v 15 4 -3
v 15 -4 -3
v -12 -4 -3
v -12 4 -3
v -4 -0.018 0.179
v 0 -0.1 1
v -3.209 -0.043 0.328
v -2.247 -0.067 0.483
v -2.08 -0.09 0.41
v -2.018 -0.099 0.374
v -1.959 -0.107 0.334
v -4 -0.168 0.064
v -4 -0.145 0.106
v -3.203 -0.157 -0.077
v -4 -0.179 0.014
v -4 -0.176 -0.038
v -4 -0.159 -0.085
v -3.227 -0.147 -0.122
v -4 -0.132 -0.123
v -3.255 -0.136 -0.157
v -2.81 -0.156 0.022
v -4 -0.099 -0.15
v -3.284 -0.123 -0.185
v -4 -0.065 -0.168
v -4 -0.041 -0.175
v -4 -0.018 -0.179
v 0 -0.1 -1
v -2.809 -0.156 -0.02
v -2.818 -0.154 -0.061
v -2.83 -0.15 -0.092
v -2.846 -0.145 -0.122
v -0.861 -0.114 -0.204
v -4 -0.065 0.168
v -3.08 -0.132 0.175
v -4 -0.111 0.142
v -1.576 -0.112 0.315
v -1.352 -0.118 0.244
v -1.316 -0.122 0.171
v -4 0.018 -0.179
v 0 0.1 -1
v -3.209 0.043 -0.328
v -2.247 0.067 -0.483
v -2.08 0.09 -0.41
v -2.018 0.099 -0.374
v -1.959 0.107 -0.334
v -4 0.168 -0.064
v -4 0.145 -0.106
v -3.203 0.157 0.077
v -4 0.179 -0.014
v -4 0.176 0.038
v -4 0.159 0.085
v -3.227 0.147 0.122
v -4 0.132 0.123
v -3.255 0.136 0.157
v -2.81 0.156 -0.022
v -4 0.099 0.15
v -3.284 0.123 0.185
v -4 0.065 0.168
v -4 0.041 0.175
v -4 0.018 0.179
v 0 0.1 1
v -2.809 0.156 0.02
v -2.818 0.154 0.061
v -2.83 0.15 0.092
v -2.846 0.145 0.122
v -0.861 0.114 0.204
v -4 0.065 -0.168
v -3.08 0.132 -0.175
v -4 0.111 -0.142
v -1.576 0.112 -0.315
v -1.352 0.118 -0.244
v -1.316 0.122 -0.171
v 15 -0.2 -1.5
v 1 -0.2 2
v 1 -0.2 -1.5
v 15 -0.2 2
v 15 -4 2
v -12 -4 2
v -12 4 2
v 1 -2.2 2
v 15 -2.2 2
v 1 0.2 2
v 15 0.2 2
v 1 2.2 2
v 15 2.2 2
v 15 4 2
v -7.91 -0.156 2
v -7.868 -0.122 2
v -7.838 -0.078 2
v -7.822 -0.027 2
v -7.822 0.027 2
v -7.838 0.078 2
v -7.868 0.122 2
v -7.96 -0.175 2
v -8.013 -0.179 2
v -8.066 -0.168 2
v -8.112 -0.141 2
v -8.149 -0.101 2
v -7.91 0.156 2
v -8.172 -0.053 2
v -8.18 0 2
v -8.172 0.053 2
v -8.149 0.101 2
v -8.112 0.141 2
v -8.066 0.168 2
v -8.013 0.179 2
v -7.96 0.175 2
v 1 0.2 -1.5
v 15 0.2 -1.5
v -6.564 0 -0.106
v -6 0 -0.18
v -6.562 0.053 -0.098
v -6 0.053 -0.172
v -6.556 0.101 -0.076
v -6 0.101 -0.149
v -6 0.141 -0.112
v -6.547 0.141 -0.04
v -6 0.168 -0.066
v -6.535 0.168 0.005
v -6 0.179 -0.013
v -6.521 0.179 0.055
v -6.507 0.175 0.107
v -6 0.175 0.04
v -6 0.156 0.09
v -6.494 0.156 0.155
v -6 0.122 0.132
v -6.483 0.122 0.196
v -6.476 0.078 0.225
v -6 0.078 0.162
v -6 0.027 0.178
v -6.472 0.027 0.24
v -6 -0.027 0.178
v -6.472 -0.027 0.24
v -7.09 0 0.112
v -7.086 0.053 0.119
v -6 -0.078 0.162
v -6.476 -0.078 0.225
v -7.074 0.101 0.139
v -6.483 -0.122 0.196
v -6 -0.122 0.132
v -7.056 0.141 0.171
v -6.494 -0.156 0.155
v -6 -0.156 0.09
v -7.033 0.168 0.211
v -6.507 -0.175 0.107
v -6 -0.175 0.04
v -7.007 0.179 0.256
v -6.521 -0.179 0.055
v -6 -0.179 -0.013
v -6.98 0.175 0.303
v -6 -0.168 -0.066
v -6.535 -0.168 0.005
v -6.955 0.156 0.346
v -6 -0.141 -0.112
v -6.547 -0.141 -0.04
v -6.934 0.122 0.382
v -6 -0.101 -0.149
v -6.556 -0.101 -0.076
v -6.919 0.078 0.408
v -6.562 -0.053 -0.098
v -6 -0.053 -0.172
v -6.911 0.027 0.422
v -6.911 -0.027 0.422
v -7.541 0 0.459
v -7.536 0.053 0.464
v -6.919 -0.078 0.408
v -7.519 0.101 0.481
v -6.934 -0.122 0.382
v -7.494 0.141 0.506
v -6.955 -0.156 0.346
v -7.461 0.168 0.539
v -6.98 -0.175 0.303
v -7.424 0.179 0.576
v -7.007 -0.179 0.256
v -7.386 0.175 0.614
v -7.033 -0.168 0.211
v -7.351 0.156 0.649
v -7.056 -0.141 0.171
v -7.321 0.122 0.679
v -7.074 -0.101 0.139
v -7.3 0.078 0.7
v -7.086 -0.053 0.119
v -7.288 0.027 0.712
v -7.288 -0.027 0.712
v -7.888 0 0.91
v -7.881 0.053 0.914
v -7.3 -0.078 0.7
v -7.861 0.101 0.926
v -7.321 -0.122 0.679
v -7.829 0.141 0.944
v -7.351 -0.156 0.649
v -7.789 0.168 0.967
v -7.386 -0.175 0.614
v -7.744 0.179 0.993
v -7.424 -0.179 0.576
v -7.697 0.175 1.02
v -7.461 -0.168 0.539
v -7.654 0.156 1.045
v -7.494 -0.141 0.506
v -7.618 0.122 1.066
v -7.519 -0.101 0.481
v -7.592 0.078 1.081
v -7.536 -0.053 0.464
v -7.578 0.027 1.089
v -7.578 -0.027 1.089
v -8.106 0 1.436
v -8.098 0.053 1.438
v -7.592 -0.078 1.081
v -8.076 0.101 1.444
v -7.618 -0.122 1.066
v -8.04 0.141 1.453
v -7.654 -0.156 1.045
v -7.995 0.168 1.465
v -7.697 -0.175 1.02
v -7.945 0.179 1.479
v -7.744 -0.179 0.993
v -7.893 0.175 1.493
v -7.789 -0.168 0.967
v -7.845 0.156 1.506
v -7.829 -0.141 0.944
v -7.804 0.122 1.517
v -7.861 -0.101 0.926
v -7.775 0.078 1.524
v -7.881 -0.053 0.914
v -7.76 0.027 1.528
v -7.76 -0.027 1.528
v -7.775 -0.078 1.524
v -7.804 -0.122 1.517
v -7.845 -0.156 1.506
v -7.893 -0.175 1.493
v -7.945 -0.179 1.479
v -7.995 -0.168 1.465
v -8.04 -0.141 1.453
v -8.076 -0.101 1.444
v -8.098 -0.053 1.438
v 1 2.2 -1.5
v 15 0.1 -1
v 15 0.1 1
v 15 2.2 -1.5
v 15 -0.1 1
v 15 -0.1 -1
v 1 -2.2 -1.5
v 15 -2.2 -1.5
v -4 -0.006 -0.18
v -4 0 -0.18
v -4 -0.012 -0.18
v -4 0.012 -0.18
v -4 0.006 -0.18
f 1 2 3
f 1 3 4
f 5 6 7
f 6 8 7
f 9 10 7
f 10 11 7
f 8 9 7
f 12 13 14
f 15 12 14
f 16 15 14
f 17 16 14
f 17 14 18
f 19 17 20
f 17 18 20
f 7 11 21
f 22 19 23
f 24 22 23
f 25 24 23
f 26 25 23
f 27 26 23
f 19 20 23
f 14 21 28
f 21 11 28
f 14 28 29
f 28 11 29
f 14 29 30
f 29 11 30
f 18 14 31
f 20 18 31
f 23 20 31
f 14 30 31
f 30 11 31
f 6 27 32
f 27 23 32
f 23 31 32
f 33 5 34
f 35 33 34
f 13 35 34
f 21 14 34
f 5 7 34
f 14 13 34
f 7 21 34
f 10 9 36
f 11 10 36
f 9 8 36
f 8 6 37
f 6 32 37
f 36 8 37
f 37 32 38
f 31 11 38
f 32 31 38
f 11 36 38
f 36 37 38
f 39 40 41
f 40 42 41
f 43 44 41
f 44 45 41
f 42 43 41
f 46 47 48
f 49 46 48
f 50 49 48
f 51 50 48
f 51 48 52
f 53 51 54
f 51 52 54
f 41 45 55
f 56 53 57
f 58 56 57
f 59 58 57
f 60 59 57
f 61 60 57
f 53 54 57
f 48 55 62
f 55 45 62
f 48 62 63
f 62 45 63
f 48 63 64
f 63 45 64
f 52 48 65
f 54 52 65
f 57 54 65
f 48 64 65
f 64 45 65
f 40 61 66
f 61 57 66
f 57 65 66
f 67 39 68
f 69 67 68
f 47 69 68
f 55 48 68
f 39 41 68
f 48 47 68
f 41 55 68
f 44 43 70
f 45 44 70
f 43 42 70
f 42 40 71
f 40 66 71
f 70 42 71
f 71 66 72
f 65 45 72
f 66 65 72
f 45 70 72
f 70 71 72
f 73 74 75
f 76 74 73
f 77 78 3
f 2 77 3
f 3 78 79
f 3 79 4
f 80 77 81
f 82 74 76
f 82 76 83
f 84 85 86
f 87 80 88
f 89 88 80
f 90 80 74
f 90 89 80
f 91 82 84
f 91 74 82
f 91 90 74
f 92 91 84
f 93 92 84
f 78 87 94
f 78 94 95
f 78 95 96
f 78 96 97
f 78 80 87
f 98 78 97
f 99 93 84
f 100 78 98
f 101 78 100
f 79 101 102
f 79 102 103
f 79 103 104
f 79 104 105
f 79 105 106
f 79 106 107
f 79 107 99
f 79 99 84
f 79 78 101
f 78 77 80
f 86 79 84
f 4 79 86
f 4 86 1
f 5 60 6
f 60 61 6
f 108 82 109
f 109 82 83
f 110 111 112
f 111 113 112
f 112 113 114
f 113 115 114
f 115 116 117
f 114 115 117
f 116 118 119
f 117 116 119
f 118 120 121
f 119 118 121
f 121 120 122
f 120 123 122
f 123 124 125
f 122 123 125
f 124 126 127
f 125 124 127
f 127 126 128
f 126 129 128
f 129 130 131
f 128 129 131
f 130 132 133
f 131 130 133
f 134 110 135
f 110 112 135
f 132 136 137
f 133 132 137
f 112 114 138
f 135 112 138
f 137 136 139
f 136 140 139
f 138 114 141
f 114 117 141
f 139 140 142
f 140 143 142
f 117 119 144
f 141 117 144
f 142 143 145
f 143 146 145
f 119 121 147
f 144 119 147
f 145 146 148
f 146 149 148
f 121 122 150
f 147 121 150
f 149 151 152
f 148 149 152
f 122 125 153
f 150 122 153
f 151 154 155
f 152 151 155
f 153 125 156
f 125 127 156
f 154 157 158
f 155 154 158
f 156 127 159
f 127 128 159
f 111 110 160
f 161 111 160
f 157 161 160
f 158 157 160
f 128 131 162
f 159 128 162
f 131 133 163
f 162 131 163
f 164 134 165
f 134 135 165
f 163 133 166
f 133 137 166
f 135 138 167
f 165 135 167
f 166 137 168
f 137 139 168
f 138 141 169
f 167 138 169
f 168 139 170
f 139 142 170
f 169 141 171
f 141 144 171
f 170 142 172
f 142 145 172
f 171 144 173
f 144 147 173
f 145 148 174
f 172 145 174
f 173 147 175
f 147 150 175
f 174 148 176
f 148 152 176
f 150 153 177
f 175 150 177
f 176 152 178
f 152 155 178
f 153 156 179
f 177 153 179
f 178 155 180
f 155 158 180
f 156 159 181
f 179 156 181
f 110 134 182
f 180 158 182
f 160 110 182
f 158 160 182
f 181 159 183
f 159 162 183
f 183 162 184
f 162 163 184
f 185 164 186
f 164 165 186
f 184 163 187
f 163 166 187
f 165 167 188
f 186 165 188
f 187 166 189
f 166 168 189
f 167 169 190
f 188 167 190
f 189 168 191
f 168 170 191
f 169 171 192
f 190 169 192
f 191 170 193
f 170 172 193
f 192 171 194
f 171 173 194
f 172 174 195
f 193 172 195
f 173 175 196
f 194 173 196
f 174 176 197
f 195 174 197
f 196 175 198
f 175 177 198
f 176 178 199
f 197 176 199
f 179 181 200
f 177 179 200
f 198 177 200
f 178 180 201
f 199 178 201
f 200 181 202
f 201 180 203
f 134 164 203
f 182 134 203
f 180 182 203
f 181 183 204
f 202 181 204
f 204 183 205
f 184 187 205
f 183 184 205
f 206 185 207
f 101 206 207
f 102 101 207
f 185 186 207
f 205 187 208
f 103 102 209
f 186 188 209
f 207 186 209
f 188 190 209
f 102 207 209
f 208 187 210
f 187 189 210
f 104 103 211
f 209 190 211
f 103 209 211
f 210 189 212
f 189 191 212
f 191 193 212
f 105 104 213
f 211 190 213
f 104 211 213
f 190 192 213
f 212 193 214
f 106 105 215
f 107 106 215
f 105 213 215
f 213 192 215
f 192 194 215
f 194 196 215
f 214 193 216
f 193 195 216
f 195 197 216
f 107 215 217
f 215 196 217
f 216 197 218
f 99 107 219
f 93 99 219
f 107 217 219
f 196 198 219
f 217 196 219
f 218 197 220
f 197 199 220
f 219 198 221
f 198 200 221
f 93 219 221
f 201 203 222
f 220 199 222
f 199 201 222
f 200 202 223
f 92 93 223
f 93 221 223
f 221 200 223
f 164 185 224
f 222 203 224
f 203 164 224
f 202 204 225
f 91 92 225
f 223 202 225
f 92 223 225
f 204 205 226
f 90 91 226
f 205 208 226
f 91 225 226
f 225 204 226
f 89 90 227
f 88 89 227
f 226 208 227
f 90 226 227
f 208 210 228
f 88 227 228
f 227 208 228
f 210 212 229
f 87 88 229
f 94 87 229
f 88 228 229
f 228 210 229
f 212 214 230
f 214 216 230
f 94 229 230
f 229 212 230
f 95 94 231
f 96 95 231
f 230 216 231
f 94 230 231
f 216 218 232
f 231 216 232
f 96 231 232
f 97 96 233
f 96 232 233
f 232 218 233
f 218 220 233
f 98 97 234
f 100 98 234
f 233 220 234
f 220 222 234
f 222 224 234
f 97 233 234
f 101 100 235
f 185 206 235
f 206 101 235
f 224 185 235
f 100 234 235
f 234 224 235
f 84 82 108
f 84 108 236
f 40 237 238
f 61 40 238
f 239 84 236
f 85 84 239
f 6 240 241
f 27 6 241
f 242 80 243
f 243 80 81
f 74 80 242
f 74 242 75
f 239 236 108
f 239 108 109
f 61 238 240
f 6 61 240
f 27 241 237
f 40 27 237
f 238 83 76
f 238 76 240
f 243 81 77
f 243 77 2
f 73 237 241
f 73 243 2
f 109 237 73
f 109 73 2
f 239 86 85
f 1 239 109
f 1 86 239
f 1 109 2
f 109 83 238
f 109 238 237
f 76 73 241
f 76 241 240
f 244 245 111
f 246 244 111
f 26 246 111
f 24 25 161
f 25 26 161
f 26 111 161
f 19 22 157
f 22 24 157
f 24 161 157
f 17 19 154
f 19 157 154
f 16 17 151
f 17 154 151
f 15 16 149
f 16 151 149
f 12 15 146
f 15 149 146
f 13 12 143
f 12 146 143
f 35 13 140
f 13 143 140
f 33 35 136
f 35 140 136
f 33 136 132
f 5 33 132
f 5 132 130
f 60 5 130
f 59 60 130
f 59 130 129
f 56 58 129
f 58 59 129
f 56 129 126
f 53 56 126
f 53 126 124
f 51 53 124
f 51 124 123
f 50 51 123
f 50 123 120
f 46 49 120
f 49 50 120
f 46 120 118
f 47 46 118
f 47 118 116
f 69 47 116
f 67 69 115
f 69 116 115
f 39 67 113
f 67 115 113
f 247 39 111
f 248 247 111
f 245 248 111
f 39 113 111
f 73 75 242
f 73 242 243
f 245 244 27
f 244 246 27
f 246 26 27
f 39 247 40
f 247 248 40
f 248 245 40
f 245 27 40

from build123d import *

# Parameters (mm, degrees)
ELEC_CH_SKETCH_W         = 0.2
ELEC_CH_SKETCH_H         = 2
SKETCH2_R                = 0.18
BOSS_EXTRUDE1_DEPTH      = 19
BOSS_EXTRUDE1_DEPTH_BACK = 8
SKETCH3_W                = 5
SKETCH3_H                = 8
SKETCH5_W                = 14
SKETCH5_H                = 2
CUT_EXTRUDE1_DEPTH       = 3.5


with BuildPart() as part:
    # Sweep2: sweep along a path in guide
    with BuildLine(Plane(origin=(0, 0, 0), x_dir=(-1, 0, 0), z_dir=(0, 1, 0))) as sweep2_path:
        Line((0, 0), (-15, 0))
    # elec_ch_sketch → Sweep2 (sweep)
    with BuildSketch(Plane.YZ):
        Rectangle(ELEC_CH_SKETCH_W, ELEC_CH_SKETCH_H)
    sweep(path=sweep2_path.line)



with BuildPart() as body_2:
    # Sweep3: sweep along a path in guide<3>
    with BuildLine(Plane(origin=(0, 0, 0), x_dir=(-1, 0, 0), z_dir=(0, 1, 0))) as sweep3_path:
        Line((4, 0), (6, 0))
        ThreePointArc((6, 0), (7.414213562, 0.585786438), (8, 2))
    # Sketch2 → Sweep3 (sweep)
    with BuildSketch(Plane(origin=(-4, 0, 0), x_dir=(0, 0, -1), z_dir=(1, 0, 0))):
        Circle(SKETCH2_R)
    sweep(path=sweep3_path.line)


with BuildPart() as part_1:
    add(part.part)

    add(body_2.part)  # Loft1 merges body 2
    # Sketch2<3> for Loft1 → Loft1 section 0
    with BuildSketch(Plane(origin=(-4, 0, 0), x_dir=(0, 0, -1), z_dir=(1, 0, 0))):
        with BuildLine():
            # circular arc as an exact rational Bezier (weights 1, cos(half-angle), 1)
            Bezier((0.179106694, -0.017910669), (0.180897761, 0), (0.179106694, 0.017910669), weights=[1, 0.995037187, 1])
            Bezier((0.179106694, 0.017910669), (0, 1.80897768), (-0.179106694, 0.017910669), weights=[1, 0.099503715, 1])
            Bezier((-0.179106694, 0.017910669), (-0.180897761, 0), (-0.179106694, -0.017910669), weights=[1, 0.995037187, 1])
            Bezier((-0.179106694, -0.017910669), (0, -1.80897768), (0.179106694, -0.017910669), weights=[1, 0.099503715, 1])
        make_face()
    # elec_ch_sketch<3> → Loft1 section 1
    with BuildSketch(Plane.YZ):
        with BuildLine():
            Line((-0.1, -1), (0.1, -1))
            Line((0.1, -1), (0.1, 1))
            Line((0.1, 1), (-0.1, 1))
            Line((-0.1, 1), (-0.1, -1))
        make_face()
    loft()


with BuildPart() as body_2_2:
    # Sketch3 → Boss-Extrude1 (new, two sides: drawn at the far end of the back side and taken through both)
    with BuildSketch(Plane(origin=(-4, 0, 0), x_dir=(0, 0, -1), z_dir=(1, 0, 0)).offset(-BOSS_EXTRUDE1_DEPTH_BACK)):
        with Locations((0.5, 0)):
            Rectangle(SKETCH3_W, SKETCH3_H)
    extrude(amount=BOSS_EXTRUDE1_DEPTH + BOSS_EXTRUDE1_DEPTH_BACK)

    # Combine1: cut part
    add(part_1.part, mode=Mode.SUBTRACT)

    # Sketch5 → Cut-Extrude1 (cut)
    with BuildSketch(Plane.XY.offset(2)):
        with Locations((8, -1.2)):
            Rectangle(SKETCH5_W, SKETCH5_H)
        with Locations((8, 1.2)):
            Rectangle(SKETCH5_W, SKETCH5_H)
    extrude(amount=-CUT_EXTRUDE1_DEPTH, mode=Mode.SUBTRACT)


solid = body_2_2.part
